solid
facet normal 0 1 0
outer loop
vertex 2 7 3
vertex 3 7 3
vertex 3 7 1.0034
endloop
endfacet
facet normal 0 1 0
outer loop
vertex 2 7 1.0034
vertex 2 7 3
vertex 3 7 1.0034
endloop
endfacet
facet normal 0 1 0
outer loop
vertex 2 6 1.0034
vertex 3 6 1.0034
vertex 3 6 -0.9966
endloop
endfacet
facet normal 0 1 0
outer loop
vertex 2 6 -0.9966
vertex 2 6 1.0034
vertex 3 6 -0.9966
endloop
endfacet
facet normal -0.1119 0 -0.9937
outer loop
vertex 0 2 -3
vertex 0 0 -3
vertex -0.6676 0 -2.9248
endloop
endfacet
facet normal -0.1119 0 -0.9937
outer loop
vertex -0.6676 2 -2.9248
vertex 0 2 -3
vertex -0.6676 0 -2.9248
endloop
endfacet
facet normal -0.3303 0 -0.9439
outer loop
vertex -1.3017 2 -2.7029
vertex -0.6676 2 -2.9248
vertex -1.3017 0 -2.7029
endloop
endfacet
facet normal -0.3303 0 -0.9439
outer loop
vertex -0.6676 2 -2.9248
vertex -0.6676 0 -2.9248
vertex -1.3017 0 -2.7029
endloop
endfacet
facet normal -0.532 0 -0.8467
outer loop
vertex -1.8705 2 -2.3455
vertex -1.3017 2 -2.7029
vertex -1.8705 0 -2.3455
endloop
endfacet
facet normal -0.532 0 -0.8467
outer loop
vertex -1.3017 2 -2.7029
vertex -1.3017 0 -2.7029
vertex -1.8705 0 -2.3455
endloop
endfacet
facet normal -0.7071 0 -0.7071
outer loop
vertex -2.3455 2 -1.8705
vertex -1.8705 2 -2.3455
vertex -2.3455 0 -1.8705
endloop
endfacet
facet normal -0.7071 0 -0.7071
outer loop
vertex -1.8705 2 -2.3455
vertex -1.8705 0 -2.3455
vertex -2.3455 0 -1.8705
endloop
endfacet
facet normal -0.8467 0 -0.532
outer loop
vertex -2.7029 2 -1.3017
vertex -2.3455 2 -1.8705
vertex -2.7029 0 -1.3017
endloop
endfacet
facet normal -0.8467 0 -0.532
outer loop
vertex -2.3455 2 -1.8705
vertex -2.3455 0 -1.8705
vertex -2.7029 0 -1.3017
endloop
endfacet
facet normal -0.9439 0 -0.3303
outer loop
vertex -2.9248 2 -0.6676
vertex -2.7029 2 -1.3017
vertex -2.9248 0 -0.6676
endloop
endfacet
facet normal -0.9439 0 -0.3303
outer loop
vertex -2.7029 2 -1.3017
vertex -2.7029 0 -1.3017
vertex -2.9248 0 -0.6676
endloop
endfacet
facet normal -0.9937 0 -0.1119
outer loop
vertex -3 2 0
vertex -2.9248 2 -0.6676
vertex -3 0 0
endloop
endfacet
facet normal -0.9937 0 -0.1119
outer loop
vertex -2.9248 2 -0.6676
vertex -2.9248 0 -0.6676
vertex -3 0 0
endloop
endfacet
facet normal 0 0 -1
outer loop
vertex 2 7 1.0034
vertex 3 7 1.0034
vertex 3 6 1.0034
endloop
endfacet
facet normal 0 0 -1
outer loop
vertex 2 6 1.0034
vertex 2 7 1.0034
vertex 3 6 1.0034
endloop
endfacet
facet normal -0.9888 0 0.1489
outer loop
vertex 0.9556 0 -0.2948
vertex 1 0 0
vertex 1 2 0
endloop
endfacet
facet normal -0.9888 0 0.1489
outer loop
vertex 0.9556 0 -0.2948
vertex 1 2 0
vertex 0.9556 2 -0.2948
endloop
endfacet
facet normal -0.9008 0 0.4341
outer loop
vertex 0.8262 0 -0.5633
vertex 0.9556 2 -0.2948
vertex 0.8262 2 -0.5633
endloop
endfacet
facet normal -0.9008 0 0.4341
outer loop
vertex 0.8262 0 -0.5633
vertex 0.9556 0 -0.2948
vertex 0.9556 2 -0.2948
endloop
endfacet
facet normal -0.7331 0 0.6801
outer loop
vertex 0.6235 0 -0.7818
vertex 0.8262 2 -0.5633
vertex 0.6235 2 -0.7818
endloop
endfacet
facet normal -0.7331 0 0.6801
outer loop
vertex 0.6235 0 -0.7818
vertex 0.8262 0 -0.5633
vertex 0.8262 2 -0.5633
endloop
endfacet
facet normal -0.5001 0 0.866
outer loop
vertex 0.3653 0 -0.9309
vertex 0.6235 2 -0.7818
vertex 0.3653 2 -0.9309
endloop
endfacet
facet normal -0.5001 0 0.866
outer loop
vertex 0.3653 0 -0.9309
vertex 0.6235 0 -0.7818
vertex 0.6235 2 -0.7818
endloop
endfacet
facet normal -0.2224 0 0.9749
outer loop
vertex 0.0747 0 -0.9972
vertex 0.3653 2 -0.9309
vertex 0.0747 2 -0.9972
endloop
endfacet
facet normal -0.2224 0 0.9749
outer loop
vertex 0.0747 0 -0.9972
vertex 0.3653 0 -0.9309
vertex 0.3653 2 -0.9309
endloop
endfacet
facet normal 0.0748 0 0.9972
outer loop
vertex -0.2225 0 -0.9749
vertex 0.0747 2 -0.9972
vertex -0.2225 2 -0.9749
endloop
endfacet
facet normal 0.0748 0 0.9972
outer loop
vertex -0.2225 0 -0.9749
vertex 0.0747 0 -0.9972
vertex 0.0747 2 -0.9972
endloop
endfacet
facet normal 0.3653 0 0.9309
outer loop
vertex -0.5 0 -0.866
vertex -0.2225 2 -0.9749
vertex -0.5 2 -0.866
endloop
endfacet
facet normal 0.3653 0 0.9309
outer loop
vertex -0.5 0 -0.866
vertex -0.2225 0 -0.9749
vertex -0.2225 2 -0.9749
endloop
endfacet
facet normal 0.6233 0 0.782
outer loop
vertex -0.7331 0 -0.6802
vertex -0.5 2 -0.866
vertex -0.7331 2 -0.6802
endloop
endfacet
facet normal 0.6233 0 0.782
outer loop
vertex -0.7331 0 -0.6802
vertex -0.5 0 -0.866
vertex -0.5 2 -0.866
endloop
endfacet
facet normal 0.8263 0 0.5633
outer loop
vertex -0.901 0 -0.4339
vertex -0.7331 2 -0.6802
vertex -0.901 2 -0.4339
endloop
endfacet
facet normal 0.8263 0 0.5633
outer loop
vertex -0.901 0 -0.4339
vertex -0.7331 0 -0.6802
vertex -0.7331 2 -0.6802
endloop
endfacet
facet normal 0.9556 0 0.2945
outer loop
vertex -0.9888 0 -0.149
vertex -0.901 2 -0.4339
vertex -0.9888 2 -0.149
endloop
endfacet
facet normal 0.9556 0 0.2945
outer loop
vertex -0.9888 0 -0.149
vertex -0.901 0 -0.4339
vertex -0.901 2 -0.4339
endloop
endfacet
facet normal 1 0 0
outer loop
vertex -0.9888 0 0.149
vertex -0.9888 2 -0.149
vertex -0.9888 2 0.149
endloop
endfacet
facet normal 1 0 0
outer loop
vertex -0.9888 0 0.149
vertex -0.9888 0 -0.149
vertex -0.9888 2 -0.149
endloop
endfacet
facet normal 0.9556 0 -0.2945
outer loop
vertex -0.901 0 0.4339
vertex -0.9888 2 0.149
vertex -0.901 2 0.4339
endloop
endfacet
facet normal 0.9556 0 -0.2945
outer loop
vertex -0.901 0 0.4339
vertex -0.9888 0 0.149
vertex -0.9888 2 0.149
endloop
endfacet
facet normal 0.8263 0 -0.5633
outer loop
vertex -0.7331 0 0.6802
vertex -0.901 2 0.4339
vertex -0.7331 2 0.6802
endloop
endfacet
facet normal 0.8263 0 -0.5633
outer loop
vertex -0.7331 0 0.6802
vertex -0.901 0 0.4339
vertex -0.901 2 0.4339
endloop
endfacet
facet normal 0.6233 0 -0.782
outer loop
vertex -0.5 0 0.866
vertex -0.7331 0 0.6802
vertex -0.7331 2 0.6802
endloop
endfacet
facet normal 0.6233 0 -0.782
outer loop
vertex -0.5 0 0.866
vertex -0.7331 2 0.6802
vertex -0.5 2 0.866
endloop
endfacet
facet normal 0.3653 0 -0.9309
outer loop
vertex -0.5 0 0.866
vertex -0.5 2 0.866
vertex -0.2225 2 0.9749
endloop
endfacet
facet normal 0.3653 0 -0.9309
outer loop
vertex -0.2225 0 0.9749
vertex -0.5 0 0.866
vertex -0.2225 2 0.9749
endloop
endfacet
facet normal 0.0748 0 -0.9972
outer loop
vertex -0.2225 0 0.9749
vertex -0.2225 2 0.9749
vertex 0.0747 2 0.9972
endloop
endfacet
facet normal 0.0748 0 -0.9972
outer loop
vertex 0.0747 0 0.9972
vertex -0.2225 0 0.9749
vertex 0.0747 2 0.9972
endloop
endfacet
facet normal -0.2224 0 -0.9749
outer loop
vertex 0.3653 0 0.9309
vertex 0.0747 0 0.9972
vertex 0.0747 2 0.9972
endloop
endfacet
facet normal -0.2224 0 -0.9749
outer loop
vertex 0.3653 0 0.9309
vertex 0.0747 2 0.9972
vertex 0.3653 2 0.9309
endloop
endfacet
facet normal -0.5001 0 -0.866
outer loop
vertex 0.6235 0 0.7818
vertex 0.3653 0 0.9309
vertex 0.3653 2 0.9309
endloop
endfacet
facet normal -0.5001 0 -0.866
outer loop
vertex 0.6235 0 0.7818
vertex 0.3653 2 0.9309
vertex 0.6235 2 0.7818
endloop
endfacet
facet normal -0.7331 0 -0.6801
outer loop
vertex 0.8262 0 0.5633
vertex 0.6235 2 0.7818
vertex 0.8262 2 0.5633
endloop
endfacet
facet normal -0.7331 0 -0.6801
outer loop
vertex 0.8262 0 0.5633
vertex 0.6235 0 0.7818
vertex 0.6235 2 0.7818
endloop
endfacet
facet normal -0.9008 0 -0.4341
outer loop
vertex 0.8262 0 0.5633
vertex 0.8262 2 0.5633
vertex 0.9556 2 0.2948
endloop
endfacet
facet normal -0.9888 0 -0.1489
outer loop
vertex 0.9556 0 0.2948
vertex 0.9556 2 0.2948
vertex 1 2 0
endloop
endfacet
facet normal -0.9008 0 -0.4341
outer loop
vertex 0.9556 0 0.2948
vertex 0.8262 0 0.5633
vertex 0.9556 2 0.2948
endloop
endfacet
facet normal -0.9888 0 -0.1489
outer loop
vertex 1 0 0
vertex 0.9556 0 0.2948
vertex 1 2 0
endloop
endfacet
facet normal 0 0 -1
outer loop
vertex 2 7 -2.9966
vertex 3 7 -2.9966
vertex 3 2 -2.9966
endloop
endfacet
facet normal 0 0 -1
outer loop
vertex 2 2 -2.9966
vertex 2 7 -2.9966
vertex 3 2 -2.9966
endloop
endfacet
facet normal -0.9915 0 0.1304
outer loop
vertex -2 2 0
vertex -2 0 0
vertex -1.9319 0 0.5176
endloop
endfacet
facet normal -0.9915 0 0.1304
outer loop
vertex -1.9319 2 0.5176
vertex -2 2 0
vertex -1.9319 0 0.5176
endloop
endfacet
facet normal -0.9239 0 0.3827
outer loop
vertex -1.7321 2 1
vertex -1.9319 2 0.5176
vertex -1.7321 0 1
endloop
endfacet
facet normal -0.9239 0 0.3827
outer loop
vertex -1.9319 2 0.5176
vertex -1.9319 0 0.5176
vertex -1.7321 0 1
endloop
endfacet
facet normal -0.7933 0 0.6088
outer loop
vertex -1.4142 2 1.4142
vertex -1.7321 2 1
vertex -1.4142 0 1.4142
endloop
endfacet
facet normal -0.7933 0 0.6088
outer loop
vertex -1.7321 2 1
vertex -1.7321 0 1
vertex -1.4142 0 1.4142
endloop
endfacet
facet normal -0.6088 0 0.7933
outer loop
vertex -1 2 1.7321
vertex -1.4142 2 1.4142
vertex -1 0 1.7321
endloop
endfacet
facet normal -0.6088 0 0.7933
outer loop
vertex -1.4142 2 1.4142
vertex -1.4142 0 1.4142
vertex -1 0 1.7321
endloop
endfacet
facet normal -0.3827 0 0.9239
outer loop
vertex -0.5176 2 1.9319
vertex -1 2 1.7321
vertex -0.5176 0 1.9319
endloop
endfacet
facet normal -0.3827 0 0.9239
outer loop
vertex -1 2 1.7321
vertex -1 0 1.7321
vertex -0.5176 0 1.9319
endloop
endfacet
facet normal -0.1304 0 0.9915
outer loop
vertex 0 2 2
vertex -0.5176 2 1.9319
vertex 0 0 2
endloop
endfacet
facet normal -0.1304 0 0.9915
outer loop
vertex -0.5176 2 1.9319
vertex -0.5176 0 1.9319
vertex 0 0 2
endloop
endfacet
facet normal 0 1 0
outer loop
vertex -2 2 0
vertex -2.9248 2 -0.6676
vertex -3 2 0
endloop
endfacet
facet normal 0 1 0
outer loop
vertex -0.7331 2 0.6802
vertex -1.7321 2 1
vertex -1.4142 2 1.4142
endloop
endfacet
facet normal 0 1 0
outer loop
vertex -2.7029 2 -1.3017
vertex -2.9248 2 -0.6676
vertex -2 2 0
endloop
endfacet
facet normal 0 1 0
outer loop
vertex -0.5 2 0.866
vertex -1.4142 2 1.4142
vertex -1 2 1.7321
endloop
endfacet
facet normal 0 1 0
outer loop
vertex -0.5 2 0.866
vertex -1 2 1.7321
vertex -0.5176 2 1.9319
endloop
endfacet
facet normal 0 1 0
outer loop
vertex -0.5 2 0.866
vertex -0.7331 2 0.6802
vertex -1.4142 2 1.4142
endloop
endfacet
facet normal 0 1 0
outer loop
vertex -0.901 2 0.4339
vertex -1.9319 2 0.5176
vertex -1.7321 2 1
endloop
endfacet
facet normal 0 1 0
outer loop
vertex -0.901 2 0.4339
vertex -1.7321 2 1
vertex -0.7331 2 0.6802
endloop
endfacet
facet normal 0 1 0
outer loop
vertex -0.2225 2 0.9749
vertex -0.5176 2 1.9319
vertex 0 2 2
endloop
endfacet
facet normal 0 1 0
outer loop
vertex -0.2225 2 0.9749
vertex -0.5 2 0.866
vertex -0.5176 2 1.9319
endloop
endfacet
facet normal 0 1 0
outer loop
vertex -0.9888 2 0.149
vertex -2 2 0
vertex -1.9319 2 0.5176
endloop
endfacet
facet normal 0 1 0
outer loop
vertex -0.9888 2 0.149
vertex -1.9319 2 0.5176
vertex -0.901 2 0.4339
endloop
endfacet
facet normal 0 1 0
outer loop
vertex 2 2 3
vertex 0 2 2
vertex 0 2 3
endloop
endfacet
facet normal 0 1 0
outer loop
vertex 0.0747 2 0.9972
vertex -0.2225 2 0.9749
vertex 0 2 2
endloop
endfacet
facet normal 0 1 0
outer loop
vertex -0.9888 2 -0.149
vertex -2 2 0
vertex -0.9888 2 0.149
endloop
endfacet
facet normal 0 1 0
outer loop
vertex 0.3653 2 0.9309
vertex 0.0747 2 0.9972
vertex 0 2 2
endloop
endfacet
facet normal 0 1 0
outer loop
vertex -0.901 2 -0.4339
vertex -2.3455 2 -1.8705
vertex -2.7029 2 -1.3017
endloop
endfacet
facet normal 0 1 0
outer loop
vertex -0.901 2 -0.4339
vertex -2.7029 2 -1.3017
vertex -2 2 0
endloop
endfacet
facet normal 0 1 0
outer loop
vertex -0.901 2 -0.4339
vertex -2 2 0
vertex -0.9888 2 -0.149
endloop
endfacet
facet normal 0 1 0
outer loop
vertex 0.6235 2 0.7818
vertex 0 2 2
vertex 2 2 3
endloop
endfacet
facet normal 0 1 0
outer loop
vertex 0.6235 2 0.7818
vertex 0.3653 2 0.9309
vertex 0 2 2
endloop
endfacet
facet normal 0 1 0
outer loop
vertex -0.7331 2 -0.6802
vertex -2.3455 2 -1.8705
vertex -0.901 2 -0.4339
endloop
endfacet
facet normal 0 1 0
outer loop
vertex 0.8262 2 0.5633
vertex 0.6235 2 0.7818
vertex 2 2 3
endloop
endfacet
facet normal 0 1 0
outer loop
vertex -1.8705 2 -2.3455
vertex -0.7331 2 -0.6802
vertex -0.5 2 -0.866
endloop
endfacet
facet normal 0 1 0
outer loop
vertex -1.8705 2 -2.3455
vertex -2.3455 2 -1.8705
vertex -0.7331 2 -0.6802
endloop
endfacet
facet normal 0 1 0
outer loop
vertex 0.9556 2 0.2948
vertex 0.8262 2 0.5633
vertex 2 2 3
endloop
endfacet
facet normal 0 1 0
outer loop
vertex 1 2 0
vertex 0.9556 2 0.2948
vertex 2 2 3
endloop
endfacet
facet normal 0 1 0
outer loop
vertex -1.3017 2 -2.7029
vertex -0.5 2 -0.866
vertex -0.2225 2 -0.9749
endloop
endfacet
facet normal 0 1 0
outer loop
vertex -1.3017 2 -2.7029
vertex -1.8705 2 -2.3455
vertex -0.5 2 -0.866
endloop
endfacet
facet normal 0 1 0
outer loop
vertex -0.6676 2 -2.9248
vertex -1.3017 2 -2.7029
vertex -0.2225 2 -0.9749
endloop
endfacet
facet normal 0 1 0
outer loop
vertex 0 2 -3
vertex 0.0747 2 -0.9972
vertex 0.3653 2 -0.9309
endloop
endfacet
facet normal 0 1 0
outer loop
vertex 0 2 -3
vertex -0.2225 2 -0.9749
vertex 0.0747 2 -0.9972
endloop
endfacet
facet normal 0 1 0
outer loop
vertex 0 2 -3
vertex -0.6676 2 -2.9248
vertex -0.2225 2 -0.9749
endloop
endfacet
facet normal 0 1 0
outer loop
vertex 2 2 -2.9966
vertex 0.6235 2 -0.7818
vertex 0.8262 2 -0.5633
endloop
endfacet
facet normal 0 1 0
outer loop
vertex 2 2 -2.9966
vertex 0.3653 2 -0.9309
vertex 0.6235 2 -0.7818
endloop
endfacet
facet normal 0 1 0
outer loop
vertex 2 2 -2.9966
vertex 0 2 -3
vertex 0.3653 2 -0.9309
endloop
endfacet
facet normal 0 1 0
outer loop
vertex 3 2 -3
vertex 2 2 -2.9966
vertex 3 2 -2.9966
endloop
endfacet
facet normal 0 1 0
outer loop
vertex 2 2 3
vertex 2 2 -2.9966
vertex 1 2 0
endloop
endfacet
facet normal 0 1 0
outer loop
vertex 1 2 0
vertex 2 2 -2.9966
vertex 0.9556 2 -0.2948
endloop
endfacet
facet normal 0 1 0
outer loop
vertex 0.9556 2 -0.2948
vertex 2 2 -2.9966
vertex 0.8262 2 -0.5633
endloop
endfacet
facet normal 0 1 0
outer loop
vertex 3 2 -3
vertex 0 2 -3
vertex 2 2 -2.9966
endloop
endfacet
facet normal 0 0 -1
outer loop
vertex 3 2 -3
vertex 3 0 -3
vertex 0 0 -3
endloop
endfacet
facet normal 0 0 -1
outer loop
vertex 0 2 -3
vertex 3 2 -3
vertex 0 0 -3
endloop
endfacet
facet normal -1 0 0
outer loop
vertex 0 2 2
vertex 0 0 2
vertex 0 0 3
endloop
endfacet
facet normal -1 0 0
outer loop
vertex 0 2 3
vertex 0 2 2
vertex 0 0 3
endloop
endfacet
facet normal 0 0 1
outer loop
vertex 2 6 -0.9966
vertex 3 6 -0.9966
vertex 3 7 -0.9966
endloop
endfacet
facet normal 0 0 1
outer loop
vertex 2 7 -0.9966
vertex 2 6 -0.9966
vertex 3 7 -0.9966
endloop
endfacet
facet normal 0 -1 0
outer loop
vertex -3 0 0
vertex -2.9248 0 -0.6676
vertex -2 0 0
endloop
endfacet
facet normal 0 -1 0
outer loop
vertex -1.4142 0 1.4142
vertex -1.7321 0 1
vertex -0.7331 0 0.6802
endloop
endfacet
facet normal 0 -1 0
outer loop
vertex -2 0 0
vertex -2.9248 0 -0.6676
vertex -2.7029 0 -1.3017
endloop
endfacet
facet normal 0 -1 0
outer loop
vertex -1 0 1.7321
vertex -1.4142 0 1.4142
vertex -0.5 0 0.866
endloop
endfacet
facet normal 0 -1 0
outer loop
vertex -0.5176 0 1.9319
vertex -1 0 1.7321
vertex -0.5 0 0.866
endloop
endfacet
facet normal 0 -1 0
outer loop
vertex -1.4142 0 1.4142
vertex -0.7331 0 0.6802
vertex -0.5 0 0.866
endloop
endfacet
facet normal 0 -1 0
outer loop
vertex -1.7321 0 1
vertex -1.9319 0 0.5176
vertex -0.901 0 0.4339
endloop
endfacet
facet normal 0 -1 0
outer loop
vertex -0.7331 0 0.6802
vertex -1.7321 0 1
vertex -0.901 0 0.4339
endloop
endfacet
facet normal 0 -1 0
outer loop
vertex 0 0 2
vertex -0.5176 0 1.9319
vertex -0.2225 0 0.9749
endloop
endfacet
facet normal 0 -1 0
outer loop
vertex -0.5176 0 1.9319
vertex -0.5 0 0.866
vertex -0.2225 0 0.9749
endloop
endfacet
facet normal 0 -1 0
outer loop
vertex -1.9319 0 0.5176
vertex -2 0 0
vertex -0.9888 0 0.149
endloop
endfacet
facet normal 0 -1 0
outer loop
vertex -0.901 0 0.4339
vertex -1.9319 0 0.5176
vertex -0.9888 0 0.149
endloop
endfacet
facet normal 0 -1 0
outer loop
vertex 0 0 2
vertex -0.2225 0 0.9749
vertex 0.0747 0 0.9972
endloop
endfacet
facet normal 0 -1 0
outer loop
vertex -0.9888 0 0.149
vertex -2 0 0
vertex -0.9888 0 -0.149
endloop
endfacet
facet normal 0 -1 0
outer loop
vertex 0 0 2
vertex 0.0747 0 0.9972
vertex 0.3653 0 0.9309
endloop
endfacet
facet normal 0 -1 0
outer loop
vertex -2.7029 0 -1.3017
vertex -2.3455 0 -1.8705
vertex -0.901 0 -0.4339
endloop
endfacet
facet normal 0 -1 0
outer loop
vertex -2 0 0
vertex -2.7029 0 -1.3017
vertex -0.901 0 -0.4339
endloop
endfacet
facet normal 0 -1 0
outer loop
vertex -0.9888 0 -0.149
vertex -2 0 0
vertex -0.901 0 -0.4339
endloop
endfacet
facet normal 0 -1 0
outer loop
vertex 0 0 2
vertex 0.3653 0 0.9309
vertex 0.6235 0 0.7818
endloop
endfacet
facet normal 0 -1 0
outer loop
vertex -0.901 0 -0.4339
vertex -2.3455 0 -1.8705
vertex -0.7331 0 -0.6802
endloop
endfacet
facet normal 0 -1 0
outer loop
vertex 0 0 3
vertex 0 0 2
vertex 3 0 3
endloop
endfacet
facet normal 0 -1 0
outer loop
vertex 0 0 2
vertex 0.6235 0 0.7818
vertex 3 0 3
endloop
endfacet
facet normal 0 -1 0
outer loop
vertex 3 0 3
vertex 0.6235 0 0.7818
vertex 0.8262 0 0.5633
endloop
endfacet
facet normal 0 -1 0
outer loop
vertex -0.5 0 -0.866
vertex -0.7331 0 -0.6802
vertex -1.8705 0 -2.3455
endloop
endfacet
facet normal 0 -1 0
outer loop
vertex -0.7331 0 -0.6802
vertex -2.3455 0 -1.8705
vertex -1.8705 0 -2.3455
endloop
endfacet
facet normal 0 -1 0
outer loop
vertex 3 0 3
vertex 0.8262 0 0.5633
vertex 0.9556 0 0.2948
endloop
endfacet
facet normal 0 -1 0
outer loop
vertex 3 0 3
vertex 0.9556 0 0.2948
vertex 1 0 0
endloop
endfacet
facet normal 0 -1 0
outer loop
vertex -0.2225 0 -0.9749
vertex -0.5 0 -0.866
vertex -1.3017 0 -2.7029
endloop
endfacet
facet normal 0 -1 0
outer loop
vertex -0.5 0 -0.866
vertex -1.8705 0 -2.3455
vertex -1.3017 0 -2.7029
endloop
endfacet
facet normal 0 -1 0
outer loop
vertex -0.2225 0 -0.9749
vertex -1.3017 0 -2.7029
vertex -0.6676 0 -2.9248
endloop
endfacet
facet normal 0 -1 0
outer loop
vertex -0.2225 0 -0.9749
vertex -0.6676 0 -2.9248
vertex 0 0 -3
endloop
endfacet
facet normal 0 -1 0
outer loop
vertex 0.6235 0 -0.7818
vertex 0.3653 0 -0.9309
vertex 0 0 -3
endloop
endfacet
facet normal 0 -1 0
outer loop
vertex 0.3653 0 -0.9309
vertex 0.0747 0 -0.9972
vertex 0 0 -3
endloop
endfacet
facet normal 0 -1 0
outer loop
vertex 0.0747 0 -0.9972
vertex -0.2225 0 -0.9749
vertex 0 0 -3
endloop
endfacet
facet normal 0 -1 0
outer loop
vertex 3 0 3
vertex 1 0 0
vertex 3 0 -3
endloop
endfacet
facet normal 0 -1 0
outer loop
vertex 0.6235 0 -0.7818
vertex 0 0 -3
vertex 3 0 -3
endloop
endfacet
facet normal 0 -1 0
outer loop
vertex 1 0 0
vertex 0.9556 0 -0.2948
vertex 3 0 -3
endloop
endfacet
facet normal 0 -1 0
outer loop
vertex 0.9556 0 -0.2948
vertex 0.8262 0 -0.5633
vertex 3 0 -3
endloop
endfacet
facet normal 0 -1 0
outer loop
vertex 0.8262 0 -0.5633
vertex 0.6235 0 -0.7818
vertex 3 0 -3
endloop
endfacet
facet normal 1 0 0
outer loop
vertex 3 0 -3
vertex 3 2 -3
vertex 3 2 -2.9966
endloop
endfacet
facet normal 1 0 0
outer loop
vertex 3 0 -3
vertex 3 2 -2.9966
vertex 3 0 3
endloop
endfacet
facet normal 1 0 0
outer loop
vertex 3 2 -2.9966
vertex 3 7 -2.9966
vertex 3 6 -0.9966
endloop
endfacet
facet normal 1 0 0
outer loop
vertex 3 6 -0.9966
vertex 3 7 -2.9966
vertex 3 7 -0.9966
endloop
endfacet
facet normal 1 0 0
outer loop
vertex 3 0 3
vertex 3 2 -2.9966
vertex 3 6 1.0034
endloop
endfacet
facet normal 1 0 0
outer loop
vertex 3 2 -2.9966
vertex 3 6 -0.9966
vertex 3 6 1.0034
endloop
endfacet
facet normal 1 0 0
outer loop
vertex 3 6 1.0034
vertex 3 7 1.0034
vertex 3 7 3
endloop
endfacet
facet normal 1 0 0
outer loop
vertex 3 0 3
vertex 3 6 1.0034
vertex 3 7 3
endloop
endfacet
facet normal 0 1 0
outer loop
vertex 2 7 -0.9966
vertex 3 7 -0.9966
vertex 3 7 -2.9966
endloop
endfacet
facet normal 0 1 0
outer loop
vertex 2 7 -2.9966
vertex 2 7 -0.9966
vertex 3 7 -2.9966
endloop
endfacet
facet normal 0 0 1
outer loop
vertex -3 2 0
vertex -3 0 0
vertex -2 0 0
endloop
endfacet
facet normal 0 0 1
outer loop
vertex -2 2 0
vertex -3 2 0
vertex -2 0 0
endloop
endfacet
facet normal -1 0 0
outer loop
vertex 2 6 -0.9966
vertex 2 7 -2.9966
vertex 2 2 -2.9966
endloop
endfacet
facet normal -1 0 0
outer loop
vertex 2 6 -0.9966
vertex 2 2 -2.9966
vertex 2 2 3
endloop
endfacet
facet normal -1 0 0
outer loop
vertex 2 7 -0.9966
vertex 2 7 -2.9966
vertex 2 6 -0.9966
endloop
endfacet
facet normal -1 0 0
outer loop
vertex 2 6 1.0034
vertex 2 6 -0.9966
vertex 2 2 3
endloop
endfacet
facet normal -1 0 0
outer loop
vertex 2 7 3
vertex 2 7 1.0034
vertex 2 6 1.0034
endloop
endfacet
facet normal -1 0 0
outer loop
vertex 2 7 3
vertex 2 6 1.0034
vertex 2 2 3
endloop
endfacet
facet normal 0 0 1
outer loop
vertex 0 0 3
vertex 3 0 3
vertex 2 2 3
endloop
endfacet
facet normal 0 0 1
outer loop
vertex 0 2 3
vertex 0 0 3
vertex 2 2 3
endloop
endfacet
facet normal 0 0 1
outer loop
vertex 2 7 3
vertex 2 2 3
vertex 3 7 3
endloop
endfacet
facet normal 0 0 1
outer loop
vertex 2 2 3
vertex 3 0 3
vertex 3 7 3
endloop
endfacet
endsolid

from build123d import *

# Parameters (mm, degrees)
SKETCH1_R           = 1
BOSS_EXTRUDE1_DEPTH = 2
BOSS_EXTRUDE2_DEPTH = 1


with BuildPart() as part:
    # Sketch1 → Boss-Extrude1 (new body)
    with BuildSketch(Plane(origin=(0, 0, 0), x_dir=(1, 0, 0), z_dir=(0, 1, 0))):
        with BuildLine():
            Line((0, -2), (0, -3))
            Line((0, -3), (3, -3))
            Line((3, -3), (3, 3))
            Line((3, 3), (0, 3))
            ThreePointArc((0, 3), (-2.121320344, 2.121320344), (-3, 0))
            Line((-3, 0), (-2, 0))
            ThreePointArc((-2, 0), (-1.414213562, -1.414213562), (0, -2))
        make_face()
        Circle(SKETCH1_R, mode=Mode.SUBTRACT)
    extrude(amount=BOSS_EXTRUDE1_DEPTH)

    # Sketch3 → Boss-Extrude2 (add)
    with BuildSketch(Plane(origin=(3, 0, 0), x_dir=(0, 0, -1), z_dir=(1, 0, 0))):
        Polygon((0.996593321, 7), (2.996593321, 7), (2.996593321, 2), (-3, 2), (-3, 7), (-1.003406679, 7), (-1.003406679, 6), (0.996593321, 6), align=None)
    extrude(amount=-BOSS_EXTRUDE2_DEPTH)


solid = part.part
